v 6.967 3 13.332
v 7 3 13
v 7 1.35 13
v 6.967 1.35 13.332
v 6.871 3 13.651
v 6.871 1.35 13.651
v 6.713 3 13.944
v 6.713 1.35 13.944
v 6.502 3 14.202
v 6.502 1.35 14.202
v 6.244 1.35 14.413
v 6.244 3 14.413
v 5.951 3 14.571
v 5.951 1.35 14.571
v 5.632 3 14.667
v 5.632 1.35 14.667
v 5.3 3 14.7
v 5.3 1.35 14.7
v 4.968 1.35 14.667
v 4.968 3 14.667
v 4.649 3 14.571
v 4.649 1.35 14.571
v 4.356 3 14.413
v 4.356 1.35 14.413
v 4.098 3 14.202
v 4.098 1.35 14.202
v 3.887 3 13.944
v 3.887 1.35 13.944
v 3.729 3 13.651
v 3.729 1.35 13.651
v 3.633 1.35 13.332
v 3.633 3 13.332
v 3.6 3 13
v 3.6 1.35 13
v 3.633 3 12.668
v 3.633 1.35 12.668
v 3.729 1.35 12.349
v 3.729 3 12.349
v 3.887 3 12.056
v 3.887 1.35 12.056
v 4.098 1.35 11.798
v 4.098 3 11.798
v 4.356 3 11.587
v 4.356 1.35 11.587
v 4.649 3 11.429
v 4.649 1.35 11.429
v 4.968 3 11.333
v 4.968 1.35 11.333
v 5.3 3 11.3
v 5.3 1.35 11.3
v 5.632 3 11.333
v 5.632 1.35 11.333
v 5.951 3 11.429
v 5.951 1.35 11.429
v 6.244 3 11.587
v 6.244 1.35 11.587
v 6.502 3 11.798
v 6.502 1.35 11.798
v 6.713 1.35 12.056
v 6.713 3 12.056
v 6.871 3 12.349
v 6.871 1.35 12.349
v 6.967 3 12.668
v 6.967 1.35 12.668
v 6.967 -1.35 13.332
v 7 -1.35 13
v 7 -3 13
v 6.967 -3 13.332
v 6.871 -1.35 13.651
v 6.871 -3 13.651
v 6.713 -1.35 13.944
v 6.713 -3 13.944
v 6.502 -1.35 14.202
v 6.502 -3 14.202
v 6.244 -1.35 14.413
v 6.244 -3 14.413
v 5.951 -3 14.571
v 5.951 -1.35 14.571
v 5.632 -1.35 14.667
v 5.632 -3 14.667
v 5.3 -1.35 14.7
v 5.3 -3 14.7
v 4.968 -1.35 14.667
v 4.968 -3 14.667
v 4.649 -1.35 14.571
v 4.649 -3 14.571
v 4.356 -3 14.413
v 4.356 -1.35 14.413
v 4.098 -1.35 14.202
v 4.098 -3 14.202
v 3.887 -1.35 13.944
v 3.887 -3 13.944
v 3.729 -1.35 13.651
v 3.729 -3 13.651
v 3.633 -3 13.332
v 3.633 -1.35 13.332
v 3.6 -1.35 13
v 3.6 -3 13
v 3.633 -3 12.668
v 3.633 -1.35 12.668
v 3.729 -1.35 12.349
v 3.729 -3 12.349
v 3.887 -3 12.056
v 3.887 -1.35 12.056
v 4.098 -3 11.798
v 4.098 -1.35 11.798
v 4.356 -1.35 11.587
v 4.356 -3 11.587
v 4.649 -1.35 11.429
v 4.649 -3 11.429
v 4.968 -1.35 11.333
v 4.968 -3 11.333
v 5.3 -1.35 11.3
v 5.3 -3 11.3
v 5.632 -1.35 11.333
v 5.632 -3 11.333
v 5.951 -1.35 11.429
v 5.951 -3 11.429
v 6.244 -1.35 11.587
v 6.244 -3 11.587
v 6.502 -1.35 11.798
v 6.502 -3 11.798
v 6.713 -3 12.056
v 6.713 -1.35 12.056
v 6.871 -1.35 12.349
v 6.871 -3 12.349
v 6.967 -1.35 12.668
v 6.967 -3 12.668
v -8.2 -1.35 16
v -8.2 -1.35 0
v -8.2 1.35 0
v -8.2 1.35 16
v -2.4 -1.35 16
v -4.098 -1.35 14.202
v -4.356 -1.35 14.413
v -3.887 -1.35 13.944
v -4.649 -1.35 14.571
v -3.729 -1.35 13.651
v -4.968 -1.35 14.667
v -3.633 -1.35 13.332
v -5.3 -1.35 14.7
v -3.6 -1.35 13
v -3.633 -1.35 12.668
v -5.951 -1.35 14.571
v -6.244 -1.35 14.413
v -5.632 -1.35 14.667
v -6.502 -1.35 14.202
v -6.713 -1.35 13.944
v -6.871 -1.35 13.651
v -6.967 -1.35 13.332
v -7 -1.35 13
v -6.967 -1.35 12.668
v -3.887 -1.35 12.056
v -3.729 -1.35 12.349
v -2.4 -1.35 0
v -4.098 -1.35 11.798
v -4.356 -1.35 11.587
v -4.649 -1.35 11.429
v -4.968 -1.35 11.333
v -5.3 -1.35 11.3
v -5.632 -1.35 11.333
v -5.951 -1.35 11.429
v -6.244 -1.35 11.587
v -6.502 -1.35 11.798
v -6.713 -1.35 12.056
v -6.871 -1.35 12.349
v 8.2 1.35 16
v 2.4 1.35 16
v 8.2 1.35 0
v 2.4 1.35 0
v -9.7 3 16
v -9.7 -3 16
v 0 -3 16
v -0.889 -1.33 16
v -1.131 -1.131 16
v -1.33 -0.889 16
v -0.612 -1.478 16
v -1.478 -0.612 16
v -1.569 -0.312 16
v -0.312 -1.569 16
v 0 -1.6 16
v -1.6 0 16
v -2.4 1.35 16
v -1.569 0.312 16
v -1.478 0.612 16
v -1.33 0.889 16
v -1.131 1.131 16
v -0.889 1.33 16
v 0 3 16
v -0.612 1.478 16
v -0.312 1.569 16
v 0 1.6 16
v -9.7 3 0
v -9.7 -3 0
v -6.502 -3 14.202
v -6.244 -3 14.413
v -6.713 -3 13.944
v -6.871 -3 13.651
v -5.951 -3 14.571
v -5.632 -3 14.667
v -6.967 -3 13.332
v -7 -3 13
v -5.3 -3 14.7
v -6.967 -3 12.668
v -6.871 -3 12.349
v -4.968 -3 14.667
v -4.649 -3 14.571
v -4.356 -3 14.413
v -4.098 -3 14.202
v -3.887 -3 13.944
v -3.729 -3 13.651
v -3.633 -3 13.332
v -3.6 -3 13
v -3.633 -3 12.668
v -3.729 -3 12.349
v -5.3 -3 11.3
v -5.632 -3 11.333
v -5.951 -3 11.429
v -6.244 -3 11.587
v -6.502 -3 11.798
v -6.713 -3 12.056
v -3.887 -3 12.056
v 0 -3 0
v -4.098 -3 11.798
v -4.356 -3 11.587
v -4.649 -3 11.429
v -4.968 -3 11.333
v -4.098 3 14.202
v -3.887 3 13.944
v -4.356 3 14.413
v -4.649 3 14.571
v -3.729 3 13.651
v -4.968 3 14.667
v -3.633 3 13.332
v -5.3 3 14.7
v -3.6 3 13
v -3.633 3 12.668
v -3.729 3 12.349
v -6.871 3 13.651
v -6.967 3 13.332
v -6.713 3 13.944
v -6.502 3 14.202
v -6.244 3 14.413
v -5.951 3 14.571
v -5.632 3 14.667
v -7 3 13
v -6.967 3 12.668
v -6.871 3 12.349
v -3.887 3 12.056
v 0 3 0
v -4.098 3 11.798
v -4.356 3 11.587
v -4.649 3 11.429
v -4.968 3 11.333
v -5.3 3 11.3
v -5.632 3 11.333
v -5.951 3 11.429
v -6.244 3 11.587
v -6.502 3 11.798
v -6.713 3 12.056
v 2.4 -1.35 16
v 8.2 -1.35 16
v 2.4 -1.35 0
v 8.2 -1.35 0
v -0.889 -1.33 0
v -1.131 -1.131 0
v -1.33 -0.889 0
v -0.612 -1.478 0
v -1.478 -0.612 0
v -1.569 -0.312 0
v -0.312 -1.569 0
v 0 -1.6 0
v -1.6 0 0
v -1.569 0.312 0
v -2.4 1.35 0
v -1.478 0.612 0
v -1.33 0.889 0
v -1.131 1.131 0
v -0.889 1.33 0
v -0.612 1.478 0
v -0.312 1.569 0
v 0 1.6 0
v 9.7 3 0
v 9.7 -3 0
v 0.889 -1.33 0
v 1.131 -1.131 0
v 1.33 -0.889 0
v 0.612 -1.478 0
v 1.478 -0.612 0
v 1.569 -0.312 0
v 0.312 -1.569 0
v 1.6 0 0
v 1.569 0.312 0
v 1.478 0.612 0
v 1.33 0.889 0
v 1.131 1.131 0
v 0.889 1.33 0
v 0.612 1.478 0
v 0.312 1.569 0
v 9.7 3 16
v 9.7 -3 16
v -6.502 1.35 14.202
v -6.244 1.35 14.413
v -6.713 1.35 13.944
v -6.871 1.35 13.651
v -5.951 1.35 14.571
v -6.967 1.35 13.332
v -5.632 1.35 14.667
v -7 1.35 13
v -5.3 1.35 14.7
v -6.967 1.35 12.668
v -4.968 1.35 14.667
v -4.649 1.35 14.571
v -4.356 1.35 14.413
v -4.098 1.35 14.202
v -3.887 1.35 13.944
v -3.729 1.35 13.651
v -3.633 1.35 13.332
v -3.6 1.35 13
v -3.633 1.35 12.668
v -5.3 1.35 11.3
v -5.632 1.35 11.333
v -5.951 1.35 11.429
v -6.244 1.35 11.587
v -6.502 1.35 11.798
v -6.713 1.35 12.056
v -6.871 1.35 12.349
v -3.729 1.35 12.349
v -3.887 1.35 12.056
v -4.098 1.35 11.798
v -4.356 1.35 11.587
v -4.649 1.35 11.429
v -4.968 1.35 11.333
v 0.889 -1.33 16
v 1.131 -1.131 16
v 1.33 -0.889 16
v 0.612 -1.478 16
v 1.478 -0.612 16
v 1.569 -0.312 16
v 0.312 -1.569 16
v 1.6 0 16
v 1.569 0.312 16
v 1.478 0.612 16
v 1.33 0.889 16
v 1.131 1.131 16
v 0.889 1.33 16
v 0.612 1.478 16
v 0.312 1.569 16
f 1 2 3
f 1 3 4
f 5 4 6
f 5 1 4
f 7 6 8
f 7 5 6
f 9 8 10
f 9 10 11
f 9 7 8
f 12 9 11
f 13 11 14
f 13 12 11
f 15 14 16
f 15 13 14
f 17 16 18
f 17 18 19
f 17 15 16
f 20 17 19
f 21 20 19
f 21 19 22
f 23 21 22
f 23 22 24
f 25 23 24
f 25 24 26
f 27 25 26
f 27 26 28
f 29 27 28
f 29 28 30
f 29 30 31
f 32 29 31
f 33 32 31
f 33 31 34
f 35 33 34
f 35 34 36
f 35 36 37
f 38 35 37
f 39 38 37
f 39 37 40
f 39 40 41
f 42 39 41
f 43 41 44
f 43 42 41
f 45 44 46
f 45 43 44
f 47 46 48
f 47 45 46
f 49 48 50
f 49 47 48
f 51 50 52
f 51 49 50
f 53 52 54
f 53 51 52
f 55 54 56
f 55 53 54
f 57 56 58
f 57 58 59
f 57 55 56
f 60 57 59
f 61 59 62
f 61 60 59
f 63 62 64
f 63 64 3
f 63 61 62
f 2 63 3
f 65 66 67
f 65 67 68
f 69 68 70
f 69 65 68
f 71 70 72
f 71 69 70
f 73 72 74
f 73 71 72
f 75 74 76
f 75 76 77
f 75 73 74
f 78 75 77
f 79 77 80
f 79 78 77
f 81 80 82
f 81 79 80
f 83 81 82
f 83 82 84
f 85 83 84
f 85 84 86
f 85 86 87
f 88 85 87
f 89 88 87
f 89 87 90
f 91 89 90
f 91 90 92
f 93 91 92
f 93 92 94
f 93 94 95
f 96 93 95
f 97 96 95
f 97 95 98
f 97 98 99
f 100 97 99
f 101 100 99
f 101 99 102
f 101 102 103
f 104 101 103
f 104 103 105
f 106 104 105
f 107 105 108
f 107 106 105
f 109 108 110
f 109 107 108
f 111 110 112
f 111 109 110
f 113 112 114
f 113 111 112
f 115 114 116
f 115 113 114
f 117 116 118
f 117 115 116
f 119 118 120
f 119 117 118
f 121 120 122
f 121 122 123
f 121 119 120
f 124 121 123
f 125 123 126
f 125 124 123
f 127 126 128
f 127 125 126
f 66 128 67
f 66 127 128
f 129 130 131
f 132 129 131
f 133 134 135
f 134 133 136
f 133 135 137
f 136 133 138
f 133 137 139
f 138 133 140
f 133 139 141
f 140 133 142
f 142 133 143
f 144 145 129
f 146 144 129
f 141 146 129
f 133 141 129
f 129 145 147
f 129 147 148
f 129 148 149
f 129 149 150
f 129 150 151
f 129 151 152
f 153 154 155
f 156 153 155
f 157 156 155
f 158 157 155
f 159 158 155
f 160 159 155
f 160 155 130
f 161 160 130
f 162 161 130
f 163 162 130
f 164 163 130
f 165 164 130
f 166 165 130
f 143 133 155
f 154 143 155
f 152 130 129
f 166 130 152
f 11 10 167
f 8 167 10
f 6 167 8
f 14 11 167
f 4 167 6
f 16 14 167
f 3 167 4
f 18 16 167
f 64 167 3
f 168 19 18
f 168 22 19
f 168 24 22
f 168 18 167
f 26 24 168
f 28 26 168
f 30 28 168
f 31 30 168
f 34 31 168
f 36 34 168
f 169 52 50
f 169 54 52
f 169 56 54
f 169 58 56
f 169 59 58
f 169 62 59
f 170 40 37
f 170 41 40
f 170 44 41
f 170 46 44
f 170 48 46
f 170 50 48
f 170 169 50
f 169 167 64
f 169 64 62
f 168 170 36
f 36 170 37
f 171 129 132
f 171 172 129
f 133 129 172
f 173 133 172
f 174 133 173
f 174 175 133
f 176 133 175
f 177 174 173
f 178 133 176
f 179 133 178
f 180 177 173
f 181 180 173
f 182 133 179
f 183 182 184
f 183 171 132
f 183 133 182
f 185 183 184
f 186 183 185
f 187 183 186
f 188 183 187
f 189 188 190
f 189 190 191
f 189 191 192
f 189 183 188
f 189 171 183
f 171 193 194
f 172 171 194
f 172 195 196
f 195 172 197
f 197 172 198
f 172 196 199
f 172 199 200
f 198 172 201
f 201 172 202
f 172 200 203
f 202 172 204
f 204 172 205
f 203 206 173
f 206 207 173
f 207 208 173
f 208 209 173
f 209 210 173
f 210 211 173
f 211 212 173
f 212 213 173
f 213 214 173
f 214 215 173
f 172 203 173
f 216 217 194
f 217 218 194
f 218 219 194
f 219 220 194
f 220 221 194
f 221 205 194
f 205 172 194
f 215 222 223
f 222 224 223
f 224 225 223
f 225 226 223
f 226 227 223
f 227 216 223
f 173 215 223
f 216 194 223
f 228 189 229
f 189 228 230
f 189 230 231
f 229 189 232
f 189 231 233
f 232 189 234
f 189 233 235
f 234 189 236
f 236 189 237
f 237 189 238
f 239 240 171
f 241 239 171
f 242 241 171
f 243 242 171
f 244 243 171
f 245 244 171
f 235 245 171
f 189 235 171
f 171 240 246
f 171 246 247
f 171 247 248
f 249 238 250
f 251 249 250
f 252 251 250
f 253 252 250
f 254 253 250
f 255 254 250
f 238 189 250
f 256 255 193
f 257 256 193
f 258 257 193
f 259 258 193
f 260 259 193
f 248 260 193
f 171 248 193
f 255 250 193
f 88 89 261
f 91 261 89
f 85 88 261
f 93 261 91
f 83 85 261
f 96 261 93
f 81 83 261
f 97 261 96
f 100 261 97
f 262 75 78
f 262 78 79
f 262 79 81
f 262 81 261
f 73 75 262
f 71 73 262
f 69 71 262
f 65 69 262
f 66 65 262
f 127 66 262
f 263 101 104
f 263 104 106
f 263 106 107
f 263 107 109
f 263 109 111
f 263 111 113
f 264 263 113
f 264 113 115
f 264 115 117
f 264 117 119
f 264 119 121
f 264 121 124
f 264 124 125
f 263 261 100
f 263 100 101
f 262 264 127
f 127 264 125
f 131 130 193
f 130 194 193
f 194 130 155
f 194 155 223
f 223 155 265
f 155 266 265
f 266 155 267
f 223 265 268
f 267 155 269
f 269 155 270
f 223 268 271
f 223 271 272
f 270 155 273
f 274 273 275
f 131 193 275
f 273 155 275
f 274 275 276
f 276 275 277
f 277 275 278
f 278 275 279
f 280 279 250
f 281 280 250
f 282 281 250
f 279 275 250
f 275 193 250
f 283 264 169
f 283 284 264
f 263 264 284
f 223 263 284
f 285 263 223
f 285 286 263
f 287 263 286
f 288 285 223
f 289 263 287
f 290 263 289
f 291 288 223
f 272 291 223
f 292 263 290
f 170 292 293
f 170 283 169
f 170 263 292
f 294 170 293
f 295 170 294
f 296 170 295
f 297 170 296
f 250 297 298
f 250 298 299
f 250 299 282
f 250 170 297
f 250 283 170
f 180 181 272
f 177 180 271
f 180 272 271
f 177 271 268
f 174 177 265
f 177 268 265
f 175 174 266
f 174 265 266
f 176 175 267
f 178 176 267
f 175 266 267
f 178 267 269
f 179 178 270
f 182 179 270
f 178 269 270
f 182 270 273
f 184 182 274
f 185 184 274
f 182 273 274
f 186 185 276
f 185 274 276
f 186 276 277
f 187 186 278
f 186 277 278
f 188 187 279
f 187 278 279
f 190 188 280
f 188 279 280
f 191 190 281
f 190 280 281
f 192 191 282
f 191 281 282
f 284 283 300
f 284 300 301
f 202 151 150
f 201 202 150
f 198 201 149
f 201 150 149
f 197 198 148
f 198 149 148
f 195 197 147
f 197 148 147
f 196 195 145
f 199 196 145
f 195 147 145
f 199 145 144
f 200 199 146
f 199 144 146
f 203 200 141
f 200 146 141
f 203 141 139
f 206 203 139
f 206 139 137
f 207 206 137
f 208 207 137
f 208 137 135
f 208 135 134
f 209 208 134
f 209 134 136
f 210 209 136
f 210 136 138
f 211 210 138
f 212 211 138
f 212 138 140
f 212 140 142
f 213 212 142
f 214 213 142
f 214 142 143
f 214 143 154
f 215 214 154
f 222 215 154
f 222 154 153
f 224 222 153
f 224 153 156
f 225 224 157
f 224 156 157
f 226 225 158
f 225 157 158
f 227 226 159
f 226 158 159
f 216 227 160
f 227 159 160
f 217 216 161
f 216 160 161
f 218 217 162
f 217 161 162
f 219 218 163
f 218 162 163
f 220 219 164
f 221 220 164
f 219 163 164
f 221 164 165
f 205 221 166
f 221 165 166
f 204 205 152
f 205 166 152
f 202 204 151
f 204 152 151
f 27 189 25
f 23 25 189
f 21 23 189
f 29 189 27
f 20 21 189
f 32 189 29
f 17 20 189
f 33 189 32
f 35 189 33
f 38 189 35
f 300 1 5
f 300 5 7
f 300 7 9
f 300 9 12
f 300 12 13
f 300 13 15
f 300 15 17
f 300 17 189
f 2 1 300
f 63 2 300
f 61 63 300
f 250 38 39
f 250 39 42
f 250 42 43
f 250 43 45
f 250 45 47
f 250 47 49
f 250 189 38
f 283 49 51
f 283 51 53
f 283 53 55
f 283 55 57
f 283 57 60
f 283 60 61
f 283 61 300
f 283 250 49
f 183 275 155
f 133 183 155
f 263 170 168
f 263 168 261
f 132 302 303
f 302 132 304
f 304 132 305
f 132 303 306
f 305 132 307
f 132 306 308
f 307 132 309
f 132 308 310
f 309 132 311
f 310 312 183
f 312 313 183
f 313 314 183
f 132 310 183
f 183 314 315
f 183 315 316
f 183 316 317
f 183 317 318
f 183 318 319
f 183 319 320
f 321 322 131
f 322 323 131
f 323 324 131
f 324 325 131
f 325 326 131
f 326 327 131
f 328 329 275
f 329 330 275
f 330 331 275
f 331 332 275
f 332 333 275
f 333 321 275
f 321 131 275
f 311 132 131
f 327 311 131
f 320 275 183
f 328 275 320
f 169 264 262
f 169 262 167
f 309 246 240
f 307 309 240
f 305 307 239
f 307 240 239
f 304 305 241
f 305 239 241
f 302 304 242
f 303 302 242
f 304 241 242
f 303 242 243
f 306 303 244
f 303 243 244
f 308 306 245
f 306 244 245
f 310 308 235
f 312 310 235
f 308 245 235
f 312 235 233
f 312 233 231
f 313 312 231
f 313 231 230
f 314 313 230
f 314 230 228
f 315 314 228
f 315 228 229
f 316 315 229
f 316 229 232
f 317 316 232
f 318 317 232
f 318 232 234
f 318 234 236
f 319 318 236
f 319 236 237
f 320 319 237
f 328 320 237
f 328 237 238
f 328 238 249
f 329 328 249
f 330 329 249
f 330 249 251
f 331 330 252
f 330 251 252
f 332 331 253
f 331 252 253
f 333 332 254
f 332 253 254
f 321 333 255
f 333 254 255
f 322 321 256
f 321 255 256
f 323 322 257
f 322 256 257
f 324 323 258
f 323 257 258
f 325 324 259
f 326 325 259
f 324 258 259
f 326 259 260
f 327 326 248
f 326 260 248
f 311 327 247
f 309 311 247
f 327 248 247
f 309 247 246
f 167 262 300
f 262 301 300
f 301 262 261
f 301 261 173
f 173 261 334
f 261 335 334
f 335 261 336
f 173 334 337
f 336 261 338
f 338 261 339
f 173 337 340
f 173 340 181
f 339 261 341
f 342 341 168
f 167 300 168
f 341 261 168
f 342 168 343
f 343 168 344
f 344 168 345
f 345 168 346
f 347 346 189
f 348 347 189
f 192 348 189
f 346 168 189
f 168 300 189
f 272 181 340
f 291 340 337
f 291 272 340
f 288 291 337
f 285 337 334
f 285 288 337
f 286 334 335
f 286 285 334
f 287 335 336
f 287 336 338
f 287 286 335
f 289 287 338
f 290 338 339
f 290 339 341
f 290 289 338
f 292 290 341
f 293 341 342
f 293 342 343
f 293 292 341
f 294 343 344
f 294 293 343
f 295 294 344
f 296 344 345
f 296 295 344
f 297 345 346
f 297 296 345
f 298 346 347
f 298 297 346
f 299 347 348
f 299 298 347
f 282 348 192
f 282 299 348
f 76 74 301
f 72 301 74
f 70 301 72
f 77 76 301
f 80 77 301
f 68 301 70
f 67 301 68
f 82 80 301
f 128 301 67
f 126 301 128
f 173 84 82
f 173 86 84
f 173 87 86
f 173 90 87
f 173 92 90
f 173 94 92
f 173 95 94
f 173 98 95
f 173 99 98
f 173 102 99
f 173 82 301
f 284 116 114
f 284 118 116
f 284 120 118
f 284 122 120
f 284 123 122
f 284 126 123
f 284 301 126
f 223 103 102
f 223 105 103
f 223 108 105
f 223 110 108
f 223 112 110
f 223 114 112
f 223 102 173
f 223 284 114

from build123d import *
from build123d import SkipClean  # not in build123d's __all__

# Parameters (mm, degrees)
F1_DEPTH = 16
F2_R     = 1.7
F3_DEPTH = 25


with BuildPart() as f1:
    # F0 (on Top) → F1 (new body)
    with BuildSketch(Plane.XY):
        with BuildLine():
            ThreePointArc((0, -1.6), (-1.6, 0), (0, 1.6))
            Line((0, 1.6), (0, 3))
            Line((0, 3), (-9.7, 3))
            Line((-9.7, 3), (-9.7, 0))
            Line((-9.7, 0), (-9.7, -3))
            Line((-9.7, -3), (0, -3))
            Line((0, -3), (0, -1.6))
        make_face()
        Polygon((-8.2, -1.35), (-8.2, 0), (-8.2, 1.35), (-2.4, 1.35), (-2.4, -1.35), align=None, mode=Mode.SUBTRACT)
    extrude(amount=F1_DEPTH)

    # F2 (on face) → F3 (cut)
    with BuildSketch(Plane(origin=(0, 3, 0), x_dir=(-1, 0, 0), z_dir=(0, 1, 0))):
        with Locations((5.3, 13)):
            Circle(F2_R)
    extrude(amount=-F3_DEPTH, mode=Mode.SUBTRACT)

    # F4: F1 across plane


with BuildPart() as f1_1:
    add(f1.part, clean=False)
    with SkipClean():  # cleaning this boolean's faces spoils the solid; the shape is the same uncleaned
        add(f1.part.mirror(Plane.YZ), clean=False)


solid = f1_1.part
